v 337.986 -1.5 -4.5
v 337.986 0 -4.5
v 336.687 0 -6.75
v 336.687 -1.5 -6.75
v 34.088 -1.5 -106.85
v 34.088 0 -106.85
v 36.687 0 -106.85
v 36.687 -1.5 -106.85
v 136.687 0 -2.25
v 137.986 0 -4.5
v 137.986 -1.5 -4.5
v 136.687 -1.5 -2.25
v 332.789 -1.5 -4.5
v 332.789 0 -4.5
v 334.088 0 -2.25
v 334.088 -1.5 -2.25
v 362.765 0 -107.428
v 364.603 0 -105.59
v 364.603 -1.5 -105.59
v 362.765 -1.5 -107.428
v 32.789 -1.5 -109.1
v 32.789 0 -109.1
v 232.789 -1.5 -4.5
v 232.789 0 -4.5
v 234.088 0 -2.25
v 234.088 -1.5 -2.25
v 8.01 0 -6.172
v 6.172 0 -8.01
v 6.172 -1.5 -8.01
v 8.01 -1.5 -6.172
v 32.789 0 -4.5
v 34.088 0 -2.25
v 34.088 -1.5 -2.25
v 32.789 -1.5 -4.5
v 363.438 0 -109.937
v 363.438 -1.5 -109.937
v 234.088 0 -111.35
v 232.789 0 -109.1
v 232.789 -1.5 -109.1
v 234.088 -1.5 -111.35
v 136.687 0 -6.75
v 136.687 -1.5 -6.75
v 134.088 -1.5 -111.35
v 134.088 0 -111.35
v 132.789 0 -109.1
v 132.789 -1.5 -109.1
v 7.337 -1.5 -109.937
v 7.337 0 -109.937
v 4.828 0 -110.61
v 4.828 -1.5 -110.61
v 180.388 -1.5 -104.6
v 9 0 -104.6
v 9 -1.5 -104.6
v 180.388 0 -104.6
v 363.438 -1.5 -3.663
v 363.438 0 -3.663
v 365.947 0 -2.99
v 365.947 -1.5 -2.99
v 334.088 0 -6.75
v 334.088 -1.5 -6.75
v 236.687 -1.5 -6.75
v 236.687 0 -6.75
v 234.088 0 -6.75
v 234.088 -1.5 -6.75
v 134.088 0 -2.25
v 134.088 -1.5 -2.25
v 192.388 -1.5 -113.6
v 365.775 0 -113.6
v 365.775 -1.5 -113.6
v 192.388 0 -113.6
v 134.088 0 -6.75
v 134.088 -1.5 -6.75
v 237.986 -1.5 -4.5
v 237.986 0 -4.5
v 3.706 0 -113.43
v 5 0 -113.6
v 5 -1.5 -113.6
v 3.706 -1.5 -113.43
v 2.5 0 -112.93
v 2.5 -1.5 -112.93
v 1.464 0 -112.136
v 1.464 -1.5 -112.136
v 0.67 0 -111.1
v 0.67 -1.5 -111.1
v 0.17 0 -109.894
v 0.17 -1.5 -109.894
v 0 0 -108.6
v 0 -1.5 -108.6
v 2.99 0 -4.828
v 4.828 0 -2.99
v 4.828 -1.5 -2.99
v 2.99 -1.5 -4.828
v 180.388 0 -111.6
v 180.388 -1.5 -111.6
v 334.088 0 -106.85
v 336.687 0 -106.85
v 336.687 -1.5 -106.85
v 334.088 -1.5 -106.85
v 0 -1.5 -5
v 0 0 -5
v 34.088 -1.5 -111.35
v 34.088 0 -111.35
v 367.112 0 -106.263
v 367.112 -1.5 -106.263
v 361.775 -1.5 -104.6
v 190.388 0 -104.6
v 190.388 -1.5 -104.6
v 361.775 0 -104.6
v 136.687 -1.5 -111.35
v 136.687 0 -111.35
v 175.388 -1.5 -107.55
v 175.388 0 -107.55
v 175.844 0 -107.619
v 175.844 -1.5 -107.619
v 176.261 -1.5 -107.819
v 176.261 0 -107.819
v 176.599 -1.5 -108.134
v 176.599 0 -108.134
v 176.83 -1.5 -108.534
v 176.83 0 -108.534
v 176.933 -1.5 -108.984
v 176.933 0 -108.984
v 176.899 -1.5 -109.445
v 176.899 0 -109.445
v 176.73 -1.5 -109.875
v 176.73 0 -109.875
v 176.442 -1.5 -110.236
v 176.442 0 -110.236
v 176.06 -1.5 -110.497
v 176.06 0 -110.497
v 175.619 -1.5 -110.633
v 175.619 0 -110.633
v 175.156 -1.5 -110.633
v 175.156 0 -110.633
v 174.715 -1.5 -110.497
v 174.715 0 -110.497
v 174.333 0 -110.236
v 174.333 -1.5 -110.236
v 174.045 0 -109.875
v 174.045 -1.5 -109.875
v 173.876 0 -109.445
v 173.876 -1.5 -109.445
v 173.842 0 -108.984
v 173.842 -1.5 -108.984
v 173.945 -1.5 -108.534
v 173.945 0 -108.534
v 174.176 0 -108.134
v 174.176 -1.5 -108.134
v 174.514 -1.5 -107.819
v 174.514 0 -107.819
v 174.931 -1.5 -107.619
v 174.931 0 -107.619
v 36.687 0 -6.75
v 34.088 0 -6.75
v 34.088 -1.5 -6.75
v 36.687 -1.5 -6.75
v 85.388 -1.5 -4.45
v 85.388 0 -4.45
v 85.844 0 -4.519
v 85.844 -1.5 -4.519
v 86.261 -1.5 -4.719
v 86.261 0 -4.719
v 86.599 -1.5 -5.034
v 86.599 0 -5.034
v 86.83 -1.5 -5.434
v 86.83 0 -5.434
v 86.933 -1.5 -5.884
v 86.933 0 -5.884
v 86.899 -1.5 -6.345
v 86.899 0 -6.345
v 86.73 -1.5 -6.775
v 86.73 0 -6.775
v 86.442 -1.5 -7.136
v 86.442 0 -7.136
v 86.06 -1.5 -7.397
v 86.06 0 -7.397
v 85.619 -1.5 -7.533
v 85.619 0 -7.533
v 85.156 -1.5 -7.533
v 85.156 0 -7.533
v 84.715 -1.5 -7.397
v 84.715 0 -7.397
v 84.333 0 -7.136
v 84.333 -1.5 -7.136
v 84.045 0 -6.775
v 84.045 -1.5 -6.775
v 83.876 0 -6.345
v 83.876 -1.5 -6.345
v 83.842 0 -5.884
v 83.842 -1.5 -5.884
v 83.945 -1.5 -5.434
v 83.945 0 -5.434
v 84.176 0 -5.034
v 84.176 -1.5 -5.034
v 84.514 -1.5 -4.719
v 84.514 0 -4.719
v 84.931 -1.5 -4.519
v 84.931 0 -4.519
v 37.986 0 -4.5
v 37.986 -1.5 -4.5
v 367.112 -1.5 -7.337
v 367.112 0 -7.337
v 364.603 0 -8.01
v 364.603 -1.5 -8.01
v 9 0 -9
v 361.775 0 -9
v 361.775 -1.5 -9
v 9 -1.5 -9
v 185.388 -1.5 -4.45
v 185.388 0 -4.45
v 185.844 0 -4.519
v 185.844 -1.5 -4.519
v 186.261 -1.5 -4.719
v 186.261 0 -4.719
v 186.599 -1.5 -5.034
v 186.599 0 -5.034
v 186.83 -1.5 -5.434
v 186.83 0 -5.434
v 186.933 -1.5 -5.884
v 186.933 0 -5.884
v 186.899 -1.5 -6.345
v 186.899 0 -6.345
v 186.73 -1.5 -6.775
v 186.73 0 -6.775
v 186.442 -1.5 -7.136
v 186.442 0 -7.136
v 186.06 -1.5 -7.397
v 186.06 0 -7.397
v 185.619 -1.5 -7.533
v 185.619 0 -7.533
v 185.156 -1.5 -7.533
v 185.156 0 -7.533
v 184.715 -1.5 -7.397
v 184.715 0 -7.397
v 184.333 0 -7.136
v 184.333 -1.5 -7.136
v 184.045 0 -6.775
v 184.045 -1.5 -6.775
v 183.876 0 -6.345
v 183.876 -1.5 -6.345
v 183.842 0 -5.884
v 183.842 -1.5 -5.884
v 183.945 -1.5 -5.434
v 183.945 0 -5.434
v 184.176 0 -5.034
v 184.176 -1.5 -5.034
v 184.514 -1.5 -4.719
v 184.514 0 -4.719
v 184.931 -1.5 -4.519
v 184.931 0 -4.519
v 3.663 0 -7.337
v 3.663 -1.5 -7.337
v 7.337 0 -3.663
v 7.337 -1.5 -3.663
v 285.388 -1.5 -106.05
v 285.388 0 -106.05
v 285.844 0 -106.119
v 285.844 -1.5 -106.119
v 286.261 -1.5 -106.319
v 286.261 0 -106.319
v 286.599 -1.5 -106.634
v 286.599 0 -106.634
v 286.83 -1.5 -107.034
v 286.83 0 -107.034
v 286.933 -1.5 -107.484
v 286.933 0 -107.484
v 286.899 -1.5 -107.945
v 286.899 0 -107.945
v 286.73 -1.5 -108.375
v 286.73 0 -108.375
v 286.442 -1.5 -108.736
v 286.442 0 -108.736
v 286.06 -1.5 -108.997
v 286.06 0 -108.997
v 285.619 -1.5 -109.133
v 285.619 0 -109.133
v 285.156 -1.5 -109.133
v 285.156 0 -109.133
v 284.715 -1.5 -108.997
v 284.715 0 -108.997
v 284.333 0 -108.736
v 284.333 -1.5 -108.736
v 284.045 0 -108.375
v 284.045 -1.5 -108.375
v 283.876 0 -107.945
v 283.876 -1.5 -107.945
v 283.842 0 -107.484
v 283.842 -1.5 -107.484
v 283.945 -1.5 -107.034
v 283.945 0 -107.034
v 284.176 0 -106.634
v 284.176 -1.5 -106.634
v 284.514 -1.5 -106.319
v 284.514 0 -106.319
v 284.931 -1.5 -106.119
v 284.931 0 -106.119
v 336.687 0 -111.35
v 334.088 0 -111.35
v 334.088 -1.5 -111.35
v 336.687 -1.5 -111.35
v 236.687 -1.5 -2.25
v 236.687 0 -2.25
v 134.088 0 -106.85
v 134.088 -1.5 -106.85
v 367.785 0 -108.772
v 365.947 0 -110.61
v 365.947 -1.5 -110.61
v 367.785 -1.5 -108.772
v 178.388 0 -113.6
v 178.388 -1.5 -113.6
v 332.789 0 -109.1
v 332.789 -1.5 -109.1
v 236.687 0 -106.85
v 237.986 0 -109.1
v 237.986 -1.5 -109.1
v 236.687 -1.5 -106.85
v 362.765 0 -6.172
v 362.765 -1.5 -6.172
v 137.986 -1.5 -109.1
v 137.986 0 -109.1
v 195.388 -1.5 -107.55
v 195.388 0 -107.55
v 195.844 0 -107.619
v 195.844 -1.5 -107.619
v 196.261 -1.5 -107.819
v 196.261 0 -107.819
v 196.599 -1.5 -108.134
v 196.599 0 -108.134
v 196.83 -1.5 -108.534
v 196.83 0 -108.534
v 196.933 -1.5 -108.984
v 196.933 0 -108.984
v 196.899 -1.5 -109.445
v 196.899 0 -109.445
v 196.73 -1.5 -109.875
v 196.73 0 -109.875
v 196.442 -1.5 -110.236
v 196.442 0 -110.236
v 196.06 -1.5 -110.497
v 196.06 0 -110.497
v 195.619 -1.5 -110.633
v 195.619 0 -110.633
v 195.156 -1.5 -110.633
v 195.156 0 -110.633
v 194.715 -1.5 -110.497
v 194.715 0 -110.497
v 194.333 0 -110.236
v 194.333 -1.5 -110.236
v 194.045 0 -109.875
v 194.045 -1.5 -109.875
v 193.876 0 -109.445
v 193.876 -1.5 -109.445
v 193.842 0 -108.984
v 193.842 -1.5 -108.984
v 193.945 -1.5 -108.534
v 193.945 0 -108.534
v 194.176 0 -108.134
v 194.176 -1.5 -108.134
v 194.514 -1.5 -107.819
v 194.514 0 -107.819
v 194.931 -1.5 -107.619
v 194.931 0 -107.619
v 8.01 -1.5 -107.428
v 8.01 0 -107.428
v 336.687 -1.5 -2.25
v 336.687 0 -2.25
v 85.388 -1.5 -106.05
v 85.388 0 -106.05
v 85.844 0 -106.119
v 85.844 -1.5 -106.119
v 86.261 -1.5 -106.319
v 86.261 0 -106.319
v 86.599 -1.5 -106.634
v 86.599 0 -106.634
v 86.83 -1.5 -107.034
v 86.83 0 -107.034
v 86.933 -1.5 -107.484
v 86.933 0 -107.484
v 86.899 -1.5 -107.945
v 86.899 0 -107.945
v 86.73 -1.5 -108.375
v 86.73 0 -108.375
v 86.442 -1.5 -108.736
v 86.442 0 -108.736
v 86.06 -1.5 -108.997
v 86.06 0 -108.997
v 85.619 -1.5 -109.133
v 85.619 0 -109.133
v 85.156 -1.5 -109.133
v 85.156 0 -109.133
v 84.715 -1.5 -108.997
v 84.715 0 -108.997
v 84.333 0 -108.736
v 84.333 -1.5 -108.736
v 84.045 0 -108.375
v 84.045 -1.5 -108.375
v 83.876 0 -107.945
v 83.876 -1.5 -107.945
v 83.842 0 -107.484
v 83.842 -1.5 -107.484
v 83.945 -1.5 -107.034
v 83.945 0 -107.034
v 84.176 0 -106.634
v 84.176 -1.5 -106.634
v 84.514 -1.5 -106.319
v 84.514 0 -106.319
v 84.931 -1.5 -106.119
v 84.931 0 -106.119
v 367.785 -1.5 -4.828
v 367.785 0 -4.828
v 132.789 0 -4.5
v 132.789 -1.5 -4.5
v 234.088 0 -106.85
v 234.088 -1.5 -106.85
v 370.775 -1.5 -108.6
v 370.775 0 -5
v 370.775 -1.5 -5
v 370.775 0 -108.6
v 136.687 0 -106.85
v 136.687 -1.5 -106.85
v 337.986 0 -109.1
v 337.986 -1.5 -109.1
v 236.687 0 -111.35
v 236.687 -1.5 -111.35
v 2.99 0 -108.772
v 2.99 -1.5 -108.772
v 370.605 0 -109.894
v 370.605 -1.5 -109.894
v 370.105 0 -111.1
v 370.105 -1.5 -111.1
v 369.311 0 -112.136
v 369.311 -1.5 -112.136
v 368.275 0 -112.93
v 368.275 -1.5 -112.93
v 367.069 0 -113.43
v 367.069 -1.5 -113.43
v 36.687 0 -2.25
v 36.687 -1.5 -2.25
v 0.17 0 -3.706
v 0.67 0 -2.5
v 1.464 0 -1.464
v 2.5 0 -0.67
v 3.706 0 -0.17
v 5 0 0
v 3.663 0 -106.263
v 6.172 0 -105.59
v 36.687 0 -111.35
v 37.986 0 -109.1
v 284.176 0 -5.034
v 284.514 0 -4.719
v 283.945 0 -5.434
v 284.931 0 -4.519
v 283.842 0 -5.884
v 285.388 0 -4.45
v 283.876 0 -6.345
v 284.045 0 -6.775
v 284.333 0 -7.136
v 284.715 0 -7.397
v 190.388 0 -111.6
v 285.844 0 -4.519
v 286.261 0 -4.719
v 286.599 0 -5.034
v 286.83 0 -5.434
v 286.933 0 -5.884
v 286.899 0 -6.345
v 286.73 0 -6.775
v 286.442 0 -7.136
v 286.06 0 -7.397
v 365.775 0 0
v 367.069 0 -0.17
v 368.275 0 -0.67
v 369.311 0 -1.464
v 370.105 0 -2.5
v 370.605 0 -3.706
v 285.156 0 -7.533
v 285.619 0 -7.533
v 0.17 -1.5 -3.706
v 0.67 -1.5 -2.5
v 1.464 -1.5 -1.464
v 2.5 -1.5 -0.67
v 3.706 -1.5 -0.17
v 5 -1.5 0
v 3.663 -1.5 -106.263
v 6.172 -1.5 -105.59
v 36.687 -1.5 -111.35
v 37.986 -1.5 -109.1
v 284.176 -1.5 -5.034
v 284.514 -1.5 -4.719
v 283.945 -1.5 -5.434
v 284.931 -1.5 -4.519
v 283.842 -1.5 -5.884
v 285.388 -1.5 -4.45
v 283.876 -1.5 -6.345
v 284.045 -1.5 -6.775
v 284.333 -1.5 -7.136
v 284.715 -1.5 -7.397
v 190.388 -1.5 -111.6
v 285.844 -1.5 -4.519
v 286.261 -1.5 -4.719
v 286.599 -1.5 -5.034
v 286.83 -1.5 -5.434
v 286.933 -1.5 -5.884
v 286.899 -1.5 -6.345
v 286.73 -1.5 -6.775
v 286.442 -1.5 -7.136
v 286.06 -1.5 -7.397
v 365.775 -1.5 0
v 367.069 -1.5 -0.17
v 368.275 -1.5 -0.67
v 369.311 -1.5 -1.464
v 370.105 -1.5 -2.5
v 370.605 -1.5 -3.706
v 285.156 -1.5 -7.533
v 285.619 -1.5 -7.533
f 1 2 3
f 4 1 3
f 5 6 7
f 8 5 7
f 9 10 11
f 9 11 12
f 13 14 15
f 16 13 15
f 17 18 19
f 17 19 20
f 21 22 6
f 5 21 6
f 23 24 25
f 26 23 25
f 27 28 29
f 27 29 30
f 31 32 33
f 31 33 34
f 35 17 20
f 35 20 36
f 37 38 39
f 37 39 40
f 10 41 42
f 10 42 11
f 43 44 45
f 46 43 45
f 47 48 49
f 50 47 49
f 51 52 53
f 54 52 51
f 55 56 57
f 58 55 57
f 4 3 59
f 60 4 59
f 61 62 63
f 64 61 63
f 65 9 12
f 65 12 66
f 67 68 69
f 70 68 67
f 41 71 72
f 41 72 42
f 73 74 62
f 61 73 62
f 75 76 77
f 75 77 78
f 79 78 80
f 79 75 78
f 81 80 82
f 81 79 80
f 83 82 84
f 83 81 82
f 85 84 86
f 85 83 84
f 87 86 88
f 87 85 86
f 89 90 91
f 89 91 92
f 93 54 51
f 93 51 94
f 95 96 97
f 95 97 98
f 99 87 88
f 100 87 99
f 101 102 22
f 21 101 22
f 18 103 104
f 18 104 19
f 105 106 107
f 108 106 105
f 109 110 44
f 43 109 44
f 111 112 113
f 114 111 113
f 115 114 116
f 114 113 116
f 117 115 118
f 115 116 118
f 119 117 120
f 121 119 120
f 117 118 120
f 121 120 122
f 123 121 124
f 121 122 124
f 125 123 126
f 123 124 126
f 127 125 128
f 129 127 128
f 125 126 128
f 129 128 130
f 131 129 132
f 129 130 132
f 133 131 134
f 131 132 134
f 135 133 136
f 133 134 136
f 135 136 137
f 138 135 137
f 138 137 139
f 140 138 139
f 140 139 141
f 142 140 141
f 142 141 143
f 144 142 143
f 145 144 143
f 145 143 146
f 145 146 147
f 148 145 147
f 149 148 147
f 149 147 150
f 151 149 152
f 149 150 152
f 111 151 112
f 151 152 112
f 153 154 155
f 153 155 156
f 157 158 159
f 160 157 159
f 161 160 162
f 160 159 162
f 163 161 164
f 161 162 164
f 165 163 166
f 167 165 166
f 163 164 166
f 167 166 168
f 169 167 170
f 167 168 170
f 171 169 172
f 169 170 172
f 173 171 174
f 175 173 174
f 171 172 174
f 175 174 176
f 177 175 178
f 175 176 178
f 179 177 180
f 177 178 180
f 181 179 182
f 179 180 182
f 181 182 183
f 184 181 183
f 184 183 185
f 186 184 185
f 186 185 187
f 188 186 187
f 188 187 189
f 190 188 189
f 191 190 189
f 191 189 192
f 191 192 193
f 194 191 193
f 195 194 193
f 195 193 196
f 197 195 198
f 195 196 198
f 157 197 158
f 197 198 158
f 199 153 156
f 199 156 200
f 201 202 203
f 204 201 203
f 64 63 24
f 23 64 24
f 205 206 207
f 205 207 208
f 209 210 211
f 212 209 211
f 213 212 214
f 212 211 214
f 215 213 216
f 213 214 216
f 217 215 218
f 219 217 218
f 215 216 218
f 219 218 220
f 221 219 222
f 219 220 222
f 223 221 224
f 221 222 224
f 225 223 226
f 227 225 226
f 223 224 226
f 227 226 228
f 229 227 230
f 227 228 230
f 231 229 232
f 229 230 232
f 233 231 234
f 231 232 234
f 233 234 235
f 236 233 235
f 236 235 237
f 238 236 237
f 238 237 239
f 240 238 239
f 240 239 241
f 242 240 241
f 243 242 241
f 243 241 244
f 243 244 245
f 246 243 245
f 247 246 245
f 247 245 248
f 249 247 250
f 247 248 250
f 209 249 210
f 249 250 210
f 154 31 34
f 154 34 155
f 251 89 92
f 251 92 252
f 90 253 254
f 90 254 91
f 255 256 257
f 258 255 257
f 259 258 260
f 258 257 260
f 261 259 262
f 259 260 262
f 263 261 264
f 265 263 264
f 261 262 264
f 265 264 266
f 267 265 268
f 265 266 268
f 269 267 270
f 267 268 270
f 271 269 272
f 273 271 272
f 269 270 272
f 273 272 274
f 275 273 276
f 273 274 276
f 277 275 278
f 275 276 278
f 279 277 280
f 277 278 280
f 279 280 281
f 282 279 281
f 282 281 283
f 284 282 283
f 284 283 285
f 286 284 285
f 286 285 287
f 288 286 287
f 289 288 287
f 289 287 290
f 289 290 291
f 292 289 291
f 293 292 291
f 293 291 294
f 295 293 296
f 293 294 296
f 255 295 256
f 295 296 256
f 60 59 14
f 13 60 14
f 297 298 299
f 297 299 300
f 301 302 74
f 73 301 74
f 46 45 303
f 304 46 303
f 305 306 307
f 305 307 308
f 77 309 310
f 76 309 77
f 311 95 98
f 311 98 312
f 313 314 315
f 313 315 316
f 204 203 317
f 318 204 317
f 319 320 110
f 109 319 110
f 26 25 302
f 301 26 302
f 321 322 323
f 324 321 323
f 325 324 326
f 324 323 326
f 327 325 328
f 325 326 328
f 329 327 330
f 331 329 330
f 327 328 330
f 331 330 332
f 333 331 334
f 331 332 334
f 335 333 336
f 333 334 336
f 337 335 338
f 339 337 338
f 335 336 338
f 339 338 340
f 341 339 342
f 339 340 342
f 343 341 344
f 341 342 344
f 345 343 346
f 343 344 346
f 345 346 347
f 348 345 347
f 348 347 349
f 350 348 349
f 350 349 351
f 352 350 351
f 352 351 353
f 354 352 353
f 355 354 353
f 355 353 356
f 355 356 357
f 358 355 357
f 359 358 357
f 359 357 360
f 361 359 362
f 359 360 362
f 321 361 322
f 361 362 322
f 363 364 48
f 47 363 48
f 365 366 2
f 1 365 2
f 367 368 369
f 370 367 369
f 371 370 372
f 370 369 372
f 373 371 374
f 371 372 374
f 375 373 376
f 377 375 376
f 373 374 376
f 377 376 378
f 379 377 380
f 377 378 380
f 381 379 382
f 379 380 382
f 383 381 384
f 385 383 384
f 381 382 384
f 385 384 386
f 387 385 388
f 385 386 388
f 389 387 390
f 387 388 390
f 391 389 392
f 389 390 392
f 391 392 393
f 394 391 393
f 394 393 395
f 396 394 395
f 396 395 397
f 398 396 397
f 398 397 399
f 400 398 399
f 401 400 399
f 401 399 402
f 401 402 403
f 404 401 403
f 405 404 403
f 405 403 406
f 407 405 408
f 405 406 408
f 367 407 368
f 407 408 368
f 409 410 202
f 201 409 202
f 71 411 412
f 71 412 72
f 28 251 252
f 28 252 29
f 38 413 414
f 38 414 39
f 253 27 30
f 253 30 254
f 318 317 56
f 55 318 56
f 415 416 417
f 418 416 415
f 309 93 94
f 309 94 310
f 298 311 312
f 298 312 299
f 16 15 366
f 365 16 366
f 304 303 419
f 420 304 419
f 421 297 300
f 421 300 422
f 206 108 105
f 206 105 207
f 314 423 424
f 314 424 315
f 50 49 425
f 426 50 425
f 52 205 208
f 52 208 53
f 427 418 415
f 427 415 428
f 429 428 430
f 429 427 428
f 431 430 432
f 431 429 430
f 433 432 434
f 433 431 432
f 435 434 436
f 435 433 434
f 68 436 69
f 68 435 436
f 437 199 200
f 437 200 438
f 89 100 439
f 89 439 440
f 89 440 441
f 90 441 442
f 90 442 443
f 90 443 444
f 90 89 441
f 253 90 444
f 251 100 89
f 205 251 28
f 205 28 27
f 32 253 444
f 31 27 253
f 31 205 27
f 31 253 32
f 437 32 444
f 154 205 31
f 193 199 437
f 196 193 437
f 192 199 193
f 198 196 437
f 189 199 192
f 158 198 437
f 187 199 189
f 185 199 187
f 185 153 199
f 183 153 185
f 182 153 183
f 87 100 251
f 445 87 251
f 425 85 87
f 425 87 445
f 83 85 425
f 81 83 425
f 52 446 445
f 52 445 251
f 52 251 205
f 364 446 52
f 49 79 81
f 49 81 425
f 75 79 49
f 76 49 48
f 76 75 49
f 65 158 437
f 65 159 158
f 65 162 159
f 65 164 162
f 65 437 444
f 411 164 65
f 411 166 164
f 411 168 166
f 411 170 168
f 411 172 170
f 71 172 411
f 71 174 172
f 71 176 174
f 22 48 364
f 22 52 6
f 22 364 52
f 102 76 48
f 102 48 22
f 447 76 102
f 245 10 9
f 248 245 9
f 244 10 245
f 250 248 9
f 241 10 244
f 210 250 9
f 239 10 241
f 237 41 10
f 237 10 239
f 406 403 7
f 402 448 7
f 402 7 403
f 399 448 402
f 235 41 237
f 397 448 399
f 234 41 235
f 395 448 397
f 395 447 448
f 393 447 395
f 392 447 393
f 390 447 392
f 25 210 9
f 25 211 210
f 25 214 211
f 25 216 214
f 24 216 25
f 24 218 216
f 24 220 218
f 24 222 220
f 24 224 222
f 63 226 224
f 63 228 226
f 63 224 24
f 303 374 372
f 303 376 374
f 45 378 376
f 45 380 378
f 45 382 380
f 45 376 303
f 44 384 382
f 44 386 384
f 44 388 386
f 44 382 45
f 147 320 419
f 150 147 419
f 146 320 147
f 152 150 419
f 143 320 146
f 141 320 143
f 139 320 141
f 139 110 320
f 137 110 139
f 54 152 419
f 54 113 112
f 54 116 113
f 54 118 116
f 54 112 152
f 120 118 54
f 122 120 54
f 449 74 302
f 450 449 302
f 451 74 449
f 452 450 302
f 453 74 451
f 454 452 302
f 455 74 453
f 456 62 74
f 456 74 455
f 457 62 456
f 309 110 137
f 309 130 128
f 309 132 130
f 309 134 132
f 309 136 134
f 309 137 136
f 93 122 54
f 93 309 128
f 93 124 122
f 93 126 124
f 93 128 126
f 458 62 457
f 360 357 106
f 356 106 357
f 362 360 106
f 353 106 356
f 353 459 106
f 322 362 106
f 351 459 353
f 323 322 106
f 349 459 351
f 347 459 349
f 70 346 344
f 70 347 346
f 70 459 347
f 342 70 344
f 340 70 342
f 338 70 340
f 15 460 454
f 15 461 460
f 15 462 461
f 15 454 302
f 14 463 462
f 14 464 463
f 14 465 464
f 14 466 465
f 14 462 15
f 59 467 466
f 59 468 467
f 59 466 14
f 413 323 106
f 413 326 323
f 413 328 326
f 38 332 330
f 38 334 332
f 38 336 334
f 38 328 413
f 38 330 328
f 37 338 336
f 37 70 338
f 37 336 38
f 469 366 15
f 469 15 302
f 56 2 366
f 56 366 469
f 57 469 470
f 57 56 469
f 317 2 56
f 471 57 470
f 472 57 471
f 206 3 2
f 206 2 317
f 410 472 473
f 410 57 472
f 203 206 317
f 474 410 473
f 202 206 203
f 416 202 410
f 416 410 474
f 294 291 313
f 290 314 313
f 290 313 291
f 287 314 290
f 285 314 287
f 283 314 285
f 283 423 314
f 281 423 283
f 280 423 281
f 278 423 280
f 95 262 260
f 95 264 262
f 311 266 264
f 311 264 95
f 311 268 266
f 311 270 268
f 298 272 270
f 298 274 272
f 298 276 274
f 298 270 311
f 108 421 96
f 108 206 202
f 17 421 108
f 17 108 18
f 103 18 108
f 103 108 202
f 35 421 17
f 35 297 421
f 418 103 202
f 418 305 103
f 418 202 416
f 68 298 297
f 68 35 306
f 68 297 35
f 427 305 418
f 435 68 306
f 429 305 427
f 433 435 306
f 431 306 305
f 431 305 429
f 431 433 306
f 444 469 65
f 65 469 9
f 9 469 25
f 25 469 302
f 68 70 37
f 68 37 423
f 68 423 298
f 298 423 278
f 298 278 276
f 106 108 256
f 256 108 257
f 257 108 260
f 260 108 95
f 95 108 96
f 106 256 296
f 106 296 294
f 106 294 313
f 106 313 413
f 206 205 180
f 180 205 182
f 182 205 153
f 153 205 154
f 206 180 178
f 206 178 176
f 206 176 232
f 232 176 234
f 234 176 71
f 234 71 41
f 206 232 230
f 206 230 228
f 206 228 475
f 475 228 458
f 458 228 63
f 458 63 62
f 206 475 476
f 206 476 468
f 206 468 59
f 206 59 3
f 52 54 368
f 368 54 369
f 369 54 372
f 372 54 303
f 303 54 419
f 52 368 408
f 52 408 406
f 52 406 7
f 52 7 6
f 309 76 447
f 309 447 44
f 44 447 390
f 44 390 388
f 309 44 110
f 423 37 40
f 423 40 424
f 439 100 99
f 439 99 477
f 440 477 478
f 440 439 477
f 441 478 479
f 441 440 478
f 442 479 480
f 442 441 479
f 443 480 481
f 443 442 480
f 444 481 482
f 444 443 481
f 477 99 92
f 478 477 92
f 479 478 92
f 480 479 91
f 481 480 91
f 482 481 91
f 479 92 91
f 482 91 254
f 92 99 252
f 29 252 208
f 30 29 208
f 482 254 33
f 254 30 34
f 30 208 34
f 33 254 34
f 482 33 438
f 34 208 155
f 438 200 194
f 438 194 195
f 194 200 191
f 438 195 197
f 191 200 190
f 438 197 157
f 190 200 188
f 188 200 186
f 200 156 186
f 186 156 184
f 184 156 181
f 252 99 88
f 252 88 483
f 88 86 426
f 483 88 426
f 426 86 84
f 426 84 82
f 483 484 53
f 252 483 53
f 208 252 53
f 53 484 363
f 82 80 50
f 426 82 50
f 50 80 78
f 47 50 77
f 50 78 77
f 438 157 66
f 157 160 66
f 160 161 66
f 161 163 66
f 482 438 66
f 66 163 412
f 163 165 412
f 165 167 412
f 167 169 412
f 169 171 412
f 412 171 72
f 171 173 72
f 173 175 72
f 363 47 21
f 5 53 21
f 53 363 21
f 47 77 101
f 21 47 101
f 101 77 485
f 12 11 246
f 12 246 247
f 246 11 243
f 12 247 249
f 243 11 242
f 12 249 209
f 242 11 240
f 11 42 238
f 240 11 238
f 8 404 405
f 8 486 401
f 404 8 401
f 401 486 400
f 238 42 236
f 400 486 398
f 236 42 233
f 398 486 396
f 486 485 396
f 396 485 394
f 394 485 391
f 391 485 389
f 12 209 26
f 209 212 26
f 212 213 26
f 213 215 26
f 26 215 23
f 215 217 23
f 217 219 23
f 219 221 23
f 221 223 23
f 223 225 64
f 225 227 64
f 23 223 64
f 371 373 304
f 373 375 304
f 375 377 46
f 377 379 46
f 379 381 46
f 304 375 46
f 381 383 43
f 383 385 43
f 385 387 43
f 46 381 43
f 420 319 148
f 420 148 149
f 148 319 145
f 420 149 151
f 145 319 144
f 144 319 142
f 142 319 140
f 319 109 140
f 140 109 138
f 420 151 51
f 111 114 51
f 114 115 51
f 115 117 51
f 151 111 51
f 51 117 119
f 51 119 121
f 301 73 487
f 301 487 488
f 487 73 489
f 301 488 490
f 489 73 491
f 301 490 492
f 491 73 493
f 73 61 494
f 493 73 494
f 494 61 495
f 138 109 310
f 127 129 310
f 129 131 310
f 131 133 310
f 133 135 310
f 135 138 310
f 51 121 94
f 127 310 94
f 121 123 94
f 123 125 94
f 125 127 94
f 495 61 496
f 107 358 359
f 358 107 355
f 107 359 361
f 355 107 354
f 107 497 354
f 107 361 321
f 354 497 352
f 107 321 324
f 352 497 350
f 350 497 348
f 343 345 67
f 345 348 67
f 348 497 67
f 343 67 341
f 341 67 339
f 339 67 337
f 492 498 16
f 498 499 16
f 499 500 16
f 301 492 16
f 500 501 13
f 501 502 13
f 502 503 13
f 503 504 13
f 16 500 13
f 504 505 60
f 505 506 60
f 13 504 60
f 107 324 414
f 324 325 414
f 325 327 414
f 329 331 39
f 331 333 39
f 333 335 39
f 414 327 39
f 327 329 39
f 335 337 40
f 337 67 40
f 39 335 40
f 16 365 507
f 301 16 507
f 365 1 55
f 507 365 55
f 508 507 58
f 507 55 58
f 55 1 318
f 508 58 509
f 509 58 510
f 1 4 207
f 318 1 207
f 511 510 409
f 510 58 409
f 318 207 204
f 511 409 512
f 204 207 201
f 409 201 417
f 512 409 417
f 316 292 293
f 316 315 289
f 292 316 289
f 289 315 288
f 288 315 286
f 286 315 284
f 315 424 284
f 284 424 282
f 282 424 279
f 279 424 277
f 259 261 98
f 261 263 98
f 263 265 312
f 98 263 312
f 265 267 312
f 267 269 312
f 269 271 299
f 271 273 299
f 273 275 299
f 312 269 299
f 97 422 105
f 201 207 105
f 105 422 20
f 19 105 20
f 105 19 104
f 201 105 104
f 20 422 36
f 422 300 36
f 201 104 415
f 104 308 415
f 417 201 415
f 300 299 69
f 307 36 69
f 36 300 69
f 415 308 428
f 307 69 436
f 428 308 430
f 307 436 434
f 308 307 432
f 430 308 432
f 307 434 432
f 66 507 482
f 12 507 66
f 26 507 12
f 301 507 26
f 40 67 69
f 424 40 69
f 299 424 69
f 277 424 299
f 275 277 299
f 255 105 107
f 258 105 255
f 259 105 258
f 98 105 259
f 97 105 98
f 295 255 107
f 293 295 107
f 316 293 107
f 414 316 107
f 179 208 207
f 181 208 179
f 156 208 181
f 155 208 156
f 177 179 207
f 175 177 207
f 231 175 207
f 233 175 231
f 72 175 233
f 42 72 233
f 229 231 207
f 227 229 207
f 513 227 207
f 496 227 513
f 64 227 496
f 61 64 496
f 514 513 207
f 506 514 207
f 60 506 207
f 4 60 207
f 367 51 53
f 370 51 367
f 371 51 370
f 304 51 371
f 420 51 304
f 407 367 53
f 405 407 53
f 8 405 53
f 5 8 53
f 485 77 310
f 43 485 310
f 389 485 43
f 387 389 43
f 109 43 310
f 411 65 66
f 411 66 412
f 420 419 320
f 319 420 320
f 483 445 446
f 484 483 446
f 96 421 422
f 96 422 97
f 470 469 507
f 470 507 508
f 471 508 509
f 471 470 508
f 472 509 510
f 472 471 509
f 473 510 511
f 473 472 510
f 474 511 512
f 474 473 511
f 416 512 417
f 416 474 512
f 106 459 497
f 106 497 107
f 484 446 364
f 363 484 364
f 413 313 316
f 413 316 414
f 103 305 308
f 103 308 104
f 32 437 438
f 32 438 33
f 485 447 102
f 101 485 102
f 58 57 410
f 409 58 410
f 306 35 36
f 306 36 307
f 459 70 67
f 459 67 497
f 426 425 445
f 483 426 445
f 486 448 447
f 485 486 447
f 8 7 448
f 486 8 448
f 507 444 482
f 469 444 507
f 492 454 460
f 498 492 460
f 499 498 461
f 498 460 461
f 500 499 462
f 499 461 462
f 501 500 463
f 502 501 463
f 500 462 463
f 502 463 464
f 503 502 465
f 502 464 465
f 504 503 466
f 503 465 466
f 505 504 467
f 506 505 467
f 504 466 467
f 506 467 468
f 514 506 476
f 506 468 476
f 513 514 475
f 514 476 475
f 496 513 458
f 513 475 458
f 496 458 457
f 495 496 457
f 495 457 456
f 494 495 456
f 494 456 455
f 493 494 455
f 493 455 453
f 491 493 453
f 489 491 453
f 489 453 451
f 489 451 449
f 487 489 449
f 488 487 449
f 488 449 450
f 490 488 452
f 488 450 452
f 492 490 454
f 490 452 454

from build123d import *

# Parameters (mm, degrees)
SKETCH1_R           = 1.55
BOSS_EXTRUDE1_DEPTH = 1.5


with BuildPart() as part:
    # Sketch1 → Boss-Extrude1 (new body)
    with BuildSketch(Plane(origin=(0, 0, 0), x_dir=(1, 0, 0), z_dir=(0, 1, 0))):
        with BuildLine():
            Line((4.482e-06, 108.600000064), (4.482e-06, 5.000000064))
            ThreePointArc((4.482e-06, 5.000000064), (1.464470576, 1.464466159), (5.000004482, 6.4e-08))
            Line((5.000004482, 6.4e-08), (365.775004482, 6.4e-08))
            ThreePointArc((365.775004482, 6.4e-08), (369.310538388, 1.464466159), (370.775004482, 5.000000064))
            Line((370.775004482, 5.000000064), (370.775004482, 108.600000064))
            ThreePointArc((370.775004482, 108.600000064), (369.310538388, 112.13553397), (365.775004482, 113.600000064))
            Line((365.775004482, 113.600000064), (192.387504482, 113.600000064))
            Line((192.387504482, 113.600000064), (190.387504482, 111.600000064))
            Line((190.387504482, 111.600000064), (190.387504482, 104.600000064))
            Line((190.387504482, 104.600000064), (361.775004482, 104.600000064))
            Line((361.775004482, 104.600000064), (361.775004482, 9.000000064))
            Line((361.775004482, 9.000000064), (9.000004482, 9.000000064))
            Line((9.000004482, 9.000000064), (9.000004482, 104.600000064))
            Line((9.000004482, 104.600000064), (180.387504482, 104.600000064))
            Line((180.387504482, 104.600000064), (180.387504482, 111.600000064))
            Line((180.387504482, 111.600000064), (178.387504482, 113.600000064))
            Line((178.387504482, 113.600000064), (5.000004482, 113.600000064))
            ThreePointArc((5.000004482, 113.600000064), (1.464470576, 112.13553397), (4.482e-06, 108.600000064))
        make_face()
        with Locations(Location((195.387504482, 109.100000064, 0), (0, 0, 270))):
            Circle(SKETCH1_R, mode=Mode.SUBTRACT)
        with Locations(Location((175.387504482, 109.100000064, 0), (0, 0, 270))):
            Circle(SKETCH1_R, mode=Mode.SUBTRACT)
        with Locations(Location((85.387504482, 107.600000064, 0), (0, 0, 270))):
            Circle(SKETCH1_R, mode=Mode.SUBTRACT)
        with Locations(Location((285.387504482, 107.600000064, 0), (0, 0, 270))):
            Circle(SKETCH1_R, mode=Mode.SUBTRACT)
        with Locations(Location((85.387504482, 6.000000064, 0), (0, 0, 270))):
            Circle(SKETCH1_R, mode=Mode.SUBTRACT)
        with Locations(Location((185.387504482, 6.000000064, 0), (0, 0, 270))):
            Circle(SKETCH1_R, mode=Mode.SUBTRACT)
        with Locations(Location((285.387504482, 6.000000064, 0), (0, 0, 270))):
            Circle(SKETCH1_R, mode=Mode.SUBTRACT)
        Polygon((234.088466376, 111.350000064), (236.686542588, 111.350000064), (237.985580693, 109.100000064), (236.686542588, 106.850000064), (234.088466376, 106.850000064), (232.789428271, 109.100000064), align=None, mode=Mode.SUBTRACT)
        Polygon((334.088466376, 111.350000064), (336.686542588, 111.350000064), (337.985580693, 109.100000064), (336.686542588, 106.850000064), (334.088466376, 106.850000064), (332.789428271, 109.100000064), align=None, mode=Mode.SUBTRACT)
        Polygon((365.947436086, 110.609548976), (367.784553393, 108.772431669), (367.112121789, 106.262882757), (364.602572878, 105.590451153), (362.765455571, 107.42756846), (363.437887175, 109.937117372), align=None, mode=Mode.SUBTRACT)
        Polygon((136.686542588, 111.350000064), (134.088466376, 111.350000064), (132.789428271, 109.100000064), (134.088466376, 106.850000064), (136.686542588, 106.850000064), (137.985580693, 109.100000064), align=None, mode=Mode.SUBTRACT)
        Polygon((36.686542588, 111.350000064), (34.088466376, 111.350000064), (32.789428271, 109.100000064), (34.088466376, 106.850000064), (36.686542588, 106.850000064), (37.985580693, 109.100000064), align=None, mode=Mode.SUBTRACT)
        Polygon((4.827572878, 110.609548976), (2.990455571, 108.772431669), (3.662887175, 106.262882757), (6.172436086, 105.590451153), (8.009553393, 107.42756846), (7.337121789, 109.937117372), align=None, mode=Mode.SUBTRACT)
        Polygon((234.088466376, 2.250000064), (236.686542588, 2.250000064), (237.985580693, 4.500000064), (236.686542588, 6.750000064), (234.088466376, 6.750000064), (232.789428271, 4.500000064), align=None, mode=Mode.SUBTRACT)
        Polygon((334.088466376, 2.250000064), (336.686542588, 2.250000064), (337.985580693, 4.500000064), (336.686542588, 6.750000064), (334.088466376, 6.750000064), (332.789428271, 4.500000064), align=None, mode=Mode.SUBTRACT)
        Polygon((365.947436086, 2.990451153), (367.784553393, 4.82756846), (367.112121789, 7.337117372), (364.602572878, 8.009548976), (362.765455571, 6.172431669), (363.437887175, 3.662882757), align=None, mode=Mode.SUBTRACT)
        Polygon((136.686542588, 2.250000064), (134.088466376, 2.250000064), (132.789428271, 4.500000064), (134.088466376, 6.750000064), (136.686542588, 6.750000064), (137.985580693, 4.500000064), align=None, mode=Mode.SUBTRACT)
        Polygon((36.686542588, 2.250000064), (34.088466376, 2.250000064), (32.789428271, 4.500000064), (34.088466376, 6.750000064), (36.686542588, 6.750000064), (37.985580693, 4.500000064), align=None, mode=Mode.SUBTRACT)
        Polygon((4.827572878, 2.990451153), (2.990455571, 4.82756846), (3.662887175, 7.337117372), (6.172436086, 8.009548976), (8.009553393, 6.172431669), (7.337121789, 3.662882757), align=None, mode=Mode.SUBTRACT)
    extrude(amount=-BOSS_EXTRUDE1_DEPTH)


solid = part.part
